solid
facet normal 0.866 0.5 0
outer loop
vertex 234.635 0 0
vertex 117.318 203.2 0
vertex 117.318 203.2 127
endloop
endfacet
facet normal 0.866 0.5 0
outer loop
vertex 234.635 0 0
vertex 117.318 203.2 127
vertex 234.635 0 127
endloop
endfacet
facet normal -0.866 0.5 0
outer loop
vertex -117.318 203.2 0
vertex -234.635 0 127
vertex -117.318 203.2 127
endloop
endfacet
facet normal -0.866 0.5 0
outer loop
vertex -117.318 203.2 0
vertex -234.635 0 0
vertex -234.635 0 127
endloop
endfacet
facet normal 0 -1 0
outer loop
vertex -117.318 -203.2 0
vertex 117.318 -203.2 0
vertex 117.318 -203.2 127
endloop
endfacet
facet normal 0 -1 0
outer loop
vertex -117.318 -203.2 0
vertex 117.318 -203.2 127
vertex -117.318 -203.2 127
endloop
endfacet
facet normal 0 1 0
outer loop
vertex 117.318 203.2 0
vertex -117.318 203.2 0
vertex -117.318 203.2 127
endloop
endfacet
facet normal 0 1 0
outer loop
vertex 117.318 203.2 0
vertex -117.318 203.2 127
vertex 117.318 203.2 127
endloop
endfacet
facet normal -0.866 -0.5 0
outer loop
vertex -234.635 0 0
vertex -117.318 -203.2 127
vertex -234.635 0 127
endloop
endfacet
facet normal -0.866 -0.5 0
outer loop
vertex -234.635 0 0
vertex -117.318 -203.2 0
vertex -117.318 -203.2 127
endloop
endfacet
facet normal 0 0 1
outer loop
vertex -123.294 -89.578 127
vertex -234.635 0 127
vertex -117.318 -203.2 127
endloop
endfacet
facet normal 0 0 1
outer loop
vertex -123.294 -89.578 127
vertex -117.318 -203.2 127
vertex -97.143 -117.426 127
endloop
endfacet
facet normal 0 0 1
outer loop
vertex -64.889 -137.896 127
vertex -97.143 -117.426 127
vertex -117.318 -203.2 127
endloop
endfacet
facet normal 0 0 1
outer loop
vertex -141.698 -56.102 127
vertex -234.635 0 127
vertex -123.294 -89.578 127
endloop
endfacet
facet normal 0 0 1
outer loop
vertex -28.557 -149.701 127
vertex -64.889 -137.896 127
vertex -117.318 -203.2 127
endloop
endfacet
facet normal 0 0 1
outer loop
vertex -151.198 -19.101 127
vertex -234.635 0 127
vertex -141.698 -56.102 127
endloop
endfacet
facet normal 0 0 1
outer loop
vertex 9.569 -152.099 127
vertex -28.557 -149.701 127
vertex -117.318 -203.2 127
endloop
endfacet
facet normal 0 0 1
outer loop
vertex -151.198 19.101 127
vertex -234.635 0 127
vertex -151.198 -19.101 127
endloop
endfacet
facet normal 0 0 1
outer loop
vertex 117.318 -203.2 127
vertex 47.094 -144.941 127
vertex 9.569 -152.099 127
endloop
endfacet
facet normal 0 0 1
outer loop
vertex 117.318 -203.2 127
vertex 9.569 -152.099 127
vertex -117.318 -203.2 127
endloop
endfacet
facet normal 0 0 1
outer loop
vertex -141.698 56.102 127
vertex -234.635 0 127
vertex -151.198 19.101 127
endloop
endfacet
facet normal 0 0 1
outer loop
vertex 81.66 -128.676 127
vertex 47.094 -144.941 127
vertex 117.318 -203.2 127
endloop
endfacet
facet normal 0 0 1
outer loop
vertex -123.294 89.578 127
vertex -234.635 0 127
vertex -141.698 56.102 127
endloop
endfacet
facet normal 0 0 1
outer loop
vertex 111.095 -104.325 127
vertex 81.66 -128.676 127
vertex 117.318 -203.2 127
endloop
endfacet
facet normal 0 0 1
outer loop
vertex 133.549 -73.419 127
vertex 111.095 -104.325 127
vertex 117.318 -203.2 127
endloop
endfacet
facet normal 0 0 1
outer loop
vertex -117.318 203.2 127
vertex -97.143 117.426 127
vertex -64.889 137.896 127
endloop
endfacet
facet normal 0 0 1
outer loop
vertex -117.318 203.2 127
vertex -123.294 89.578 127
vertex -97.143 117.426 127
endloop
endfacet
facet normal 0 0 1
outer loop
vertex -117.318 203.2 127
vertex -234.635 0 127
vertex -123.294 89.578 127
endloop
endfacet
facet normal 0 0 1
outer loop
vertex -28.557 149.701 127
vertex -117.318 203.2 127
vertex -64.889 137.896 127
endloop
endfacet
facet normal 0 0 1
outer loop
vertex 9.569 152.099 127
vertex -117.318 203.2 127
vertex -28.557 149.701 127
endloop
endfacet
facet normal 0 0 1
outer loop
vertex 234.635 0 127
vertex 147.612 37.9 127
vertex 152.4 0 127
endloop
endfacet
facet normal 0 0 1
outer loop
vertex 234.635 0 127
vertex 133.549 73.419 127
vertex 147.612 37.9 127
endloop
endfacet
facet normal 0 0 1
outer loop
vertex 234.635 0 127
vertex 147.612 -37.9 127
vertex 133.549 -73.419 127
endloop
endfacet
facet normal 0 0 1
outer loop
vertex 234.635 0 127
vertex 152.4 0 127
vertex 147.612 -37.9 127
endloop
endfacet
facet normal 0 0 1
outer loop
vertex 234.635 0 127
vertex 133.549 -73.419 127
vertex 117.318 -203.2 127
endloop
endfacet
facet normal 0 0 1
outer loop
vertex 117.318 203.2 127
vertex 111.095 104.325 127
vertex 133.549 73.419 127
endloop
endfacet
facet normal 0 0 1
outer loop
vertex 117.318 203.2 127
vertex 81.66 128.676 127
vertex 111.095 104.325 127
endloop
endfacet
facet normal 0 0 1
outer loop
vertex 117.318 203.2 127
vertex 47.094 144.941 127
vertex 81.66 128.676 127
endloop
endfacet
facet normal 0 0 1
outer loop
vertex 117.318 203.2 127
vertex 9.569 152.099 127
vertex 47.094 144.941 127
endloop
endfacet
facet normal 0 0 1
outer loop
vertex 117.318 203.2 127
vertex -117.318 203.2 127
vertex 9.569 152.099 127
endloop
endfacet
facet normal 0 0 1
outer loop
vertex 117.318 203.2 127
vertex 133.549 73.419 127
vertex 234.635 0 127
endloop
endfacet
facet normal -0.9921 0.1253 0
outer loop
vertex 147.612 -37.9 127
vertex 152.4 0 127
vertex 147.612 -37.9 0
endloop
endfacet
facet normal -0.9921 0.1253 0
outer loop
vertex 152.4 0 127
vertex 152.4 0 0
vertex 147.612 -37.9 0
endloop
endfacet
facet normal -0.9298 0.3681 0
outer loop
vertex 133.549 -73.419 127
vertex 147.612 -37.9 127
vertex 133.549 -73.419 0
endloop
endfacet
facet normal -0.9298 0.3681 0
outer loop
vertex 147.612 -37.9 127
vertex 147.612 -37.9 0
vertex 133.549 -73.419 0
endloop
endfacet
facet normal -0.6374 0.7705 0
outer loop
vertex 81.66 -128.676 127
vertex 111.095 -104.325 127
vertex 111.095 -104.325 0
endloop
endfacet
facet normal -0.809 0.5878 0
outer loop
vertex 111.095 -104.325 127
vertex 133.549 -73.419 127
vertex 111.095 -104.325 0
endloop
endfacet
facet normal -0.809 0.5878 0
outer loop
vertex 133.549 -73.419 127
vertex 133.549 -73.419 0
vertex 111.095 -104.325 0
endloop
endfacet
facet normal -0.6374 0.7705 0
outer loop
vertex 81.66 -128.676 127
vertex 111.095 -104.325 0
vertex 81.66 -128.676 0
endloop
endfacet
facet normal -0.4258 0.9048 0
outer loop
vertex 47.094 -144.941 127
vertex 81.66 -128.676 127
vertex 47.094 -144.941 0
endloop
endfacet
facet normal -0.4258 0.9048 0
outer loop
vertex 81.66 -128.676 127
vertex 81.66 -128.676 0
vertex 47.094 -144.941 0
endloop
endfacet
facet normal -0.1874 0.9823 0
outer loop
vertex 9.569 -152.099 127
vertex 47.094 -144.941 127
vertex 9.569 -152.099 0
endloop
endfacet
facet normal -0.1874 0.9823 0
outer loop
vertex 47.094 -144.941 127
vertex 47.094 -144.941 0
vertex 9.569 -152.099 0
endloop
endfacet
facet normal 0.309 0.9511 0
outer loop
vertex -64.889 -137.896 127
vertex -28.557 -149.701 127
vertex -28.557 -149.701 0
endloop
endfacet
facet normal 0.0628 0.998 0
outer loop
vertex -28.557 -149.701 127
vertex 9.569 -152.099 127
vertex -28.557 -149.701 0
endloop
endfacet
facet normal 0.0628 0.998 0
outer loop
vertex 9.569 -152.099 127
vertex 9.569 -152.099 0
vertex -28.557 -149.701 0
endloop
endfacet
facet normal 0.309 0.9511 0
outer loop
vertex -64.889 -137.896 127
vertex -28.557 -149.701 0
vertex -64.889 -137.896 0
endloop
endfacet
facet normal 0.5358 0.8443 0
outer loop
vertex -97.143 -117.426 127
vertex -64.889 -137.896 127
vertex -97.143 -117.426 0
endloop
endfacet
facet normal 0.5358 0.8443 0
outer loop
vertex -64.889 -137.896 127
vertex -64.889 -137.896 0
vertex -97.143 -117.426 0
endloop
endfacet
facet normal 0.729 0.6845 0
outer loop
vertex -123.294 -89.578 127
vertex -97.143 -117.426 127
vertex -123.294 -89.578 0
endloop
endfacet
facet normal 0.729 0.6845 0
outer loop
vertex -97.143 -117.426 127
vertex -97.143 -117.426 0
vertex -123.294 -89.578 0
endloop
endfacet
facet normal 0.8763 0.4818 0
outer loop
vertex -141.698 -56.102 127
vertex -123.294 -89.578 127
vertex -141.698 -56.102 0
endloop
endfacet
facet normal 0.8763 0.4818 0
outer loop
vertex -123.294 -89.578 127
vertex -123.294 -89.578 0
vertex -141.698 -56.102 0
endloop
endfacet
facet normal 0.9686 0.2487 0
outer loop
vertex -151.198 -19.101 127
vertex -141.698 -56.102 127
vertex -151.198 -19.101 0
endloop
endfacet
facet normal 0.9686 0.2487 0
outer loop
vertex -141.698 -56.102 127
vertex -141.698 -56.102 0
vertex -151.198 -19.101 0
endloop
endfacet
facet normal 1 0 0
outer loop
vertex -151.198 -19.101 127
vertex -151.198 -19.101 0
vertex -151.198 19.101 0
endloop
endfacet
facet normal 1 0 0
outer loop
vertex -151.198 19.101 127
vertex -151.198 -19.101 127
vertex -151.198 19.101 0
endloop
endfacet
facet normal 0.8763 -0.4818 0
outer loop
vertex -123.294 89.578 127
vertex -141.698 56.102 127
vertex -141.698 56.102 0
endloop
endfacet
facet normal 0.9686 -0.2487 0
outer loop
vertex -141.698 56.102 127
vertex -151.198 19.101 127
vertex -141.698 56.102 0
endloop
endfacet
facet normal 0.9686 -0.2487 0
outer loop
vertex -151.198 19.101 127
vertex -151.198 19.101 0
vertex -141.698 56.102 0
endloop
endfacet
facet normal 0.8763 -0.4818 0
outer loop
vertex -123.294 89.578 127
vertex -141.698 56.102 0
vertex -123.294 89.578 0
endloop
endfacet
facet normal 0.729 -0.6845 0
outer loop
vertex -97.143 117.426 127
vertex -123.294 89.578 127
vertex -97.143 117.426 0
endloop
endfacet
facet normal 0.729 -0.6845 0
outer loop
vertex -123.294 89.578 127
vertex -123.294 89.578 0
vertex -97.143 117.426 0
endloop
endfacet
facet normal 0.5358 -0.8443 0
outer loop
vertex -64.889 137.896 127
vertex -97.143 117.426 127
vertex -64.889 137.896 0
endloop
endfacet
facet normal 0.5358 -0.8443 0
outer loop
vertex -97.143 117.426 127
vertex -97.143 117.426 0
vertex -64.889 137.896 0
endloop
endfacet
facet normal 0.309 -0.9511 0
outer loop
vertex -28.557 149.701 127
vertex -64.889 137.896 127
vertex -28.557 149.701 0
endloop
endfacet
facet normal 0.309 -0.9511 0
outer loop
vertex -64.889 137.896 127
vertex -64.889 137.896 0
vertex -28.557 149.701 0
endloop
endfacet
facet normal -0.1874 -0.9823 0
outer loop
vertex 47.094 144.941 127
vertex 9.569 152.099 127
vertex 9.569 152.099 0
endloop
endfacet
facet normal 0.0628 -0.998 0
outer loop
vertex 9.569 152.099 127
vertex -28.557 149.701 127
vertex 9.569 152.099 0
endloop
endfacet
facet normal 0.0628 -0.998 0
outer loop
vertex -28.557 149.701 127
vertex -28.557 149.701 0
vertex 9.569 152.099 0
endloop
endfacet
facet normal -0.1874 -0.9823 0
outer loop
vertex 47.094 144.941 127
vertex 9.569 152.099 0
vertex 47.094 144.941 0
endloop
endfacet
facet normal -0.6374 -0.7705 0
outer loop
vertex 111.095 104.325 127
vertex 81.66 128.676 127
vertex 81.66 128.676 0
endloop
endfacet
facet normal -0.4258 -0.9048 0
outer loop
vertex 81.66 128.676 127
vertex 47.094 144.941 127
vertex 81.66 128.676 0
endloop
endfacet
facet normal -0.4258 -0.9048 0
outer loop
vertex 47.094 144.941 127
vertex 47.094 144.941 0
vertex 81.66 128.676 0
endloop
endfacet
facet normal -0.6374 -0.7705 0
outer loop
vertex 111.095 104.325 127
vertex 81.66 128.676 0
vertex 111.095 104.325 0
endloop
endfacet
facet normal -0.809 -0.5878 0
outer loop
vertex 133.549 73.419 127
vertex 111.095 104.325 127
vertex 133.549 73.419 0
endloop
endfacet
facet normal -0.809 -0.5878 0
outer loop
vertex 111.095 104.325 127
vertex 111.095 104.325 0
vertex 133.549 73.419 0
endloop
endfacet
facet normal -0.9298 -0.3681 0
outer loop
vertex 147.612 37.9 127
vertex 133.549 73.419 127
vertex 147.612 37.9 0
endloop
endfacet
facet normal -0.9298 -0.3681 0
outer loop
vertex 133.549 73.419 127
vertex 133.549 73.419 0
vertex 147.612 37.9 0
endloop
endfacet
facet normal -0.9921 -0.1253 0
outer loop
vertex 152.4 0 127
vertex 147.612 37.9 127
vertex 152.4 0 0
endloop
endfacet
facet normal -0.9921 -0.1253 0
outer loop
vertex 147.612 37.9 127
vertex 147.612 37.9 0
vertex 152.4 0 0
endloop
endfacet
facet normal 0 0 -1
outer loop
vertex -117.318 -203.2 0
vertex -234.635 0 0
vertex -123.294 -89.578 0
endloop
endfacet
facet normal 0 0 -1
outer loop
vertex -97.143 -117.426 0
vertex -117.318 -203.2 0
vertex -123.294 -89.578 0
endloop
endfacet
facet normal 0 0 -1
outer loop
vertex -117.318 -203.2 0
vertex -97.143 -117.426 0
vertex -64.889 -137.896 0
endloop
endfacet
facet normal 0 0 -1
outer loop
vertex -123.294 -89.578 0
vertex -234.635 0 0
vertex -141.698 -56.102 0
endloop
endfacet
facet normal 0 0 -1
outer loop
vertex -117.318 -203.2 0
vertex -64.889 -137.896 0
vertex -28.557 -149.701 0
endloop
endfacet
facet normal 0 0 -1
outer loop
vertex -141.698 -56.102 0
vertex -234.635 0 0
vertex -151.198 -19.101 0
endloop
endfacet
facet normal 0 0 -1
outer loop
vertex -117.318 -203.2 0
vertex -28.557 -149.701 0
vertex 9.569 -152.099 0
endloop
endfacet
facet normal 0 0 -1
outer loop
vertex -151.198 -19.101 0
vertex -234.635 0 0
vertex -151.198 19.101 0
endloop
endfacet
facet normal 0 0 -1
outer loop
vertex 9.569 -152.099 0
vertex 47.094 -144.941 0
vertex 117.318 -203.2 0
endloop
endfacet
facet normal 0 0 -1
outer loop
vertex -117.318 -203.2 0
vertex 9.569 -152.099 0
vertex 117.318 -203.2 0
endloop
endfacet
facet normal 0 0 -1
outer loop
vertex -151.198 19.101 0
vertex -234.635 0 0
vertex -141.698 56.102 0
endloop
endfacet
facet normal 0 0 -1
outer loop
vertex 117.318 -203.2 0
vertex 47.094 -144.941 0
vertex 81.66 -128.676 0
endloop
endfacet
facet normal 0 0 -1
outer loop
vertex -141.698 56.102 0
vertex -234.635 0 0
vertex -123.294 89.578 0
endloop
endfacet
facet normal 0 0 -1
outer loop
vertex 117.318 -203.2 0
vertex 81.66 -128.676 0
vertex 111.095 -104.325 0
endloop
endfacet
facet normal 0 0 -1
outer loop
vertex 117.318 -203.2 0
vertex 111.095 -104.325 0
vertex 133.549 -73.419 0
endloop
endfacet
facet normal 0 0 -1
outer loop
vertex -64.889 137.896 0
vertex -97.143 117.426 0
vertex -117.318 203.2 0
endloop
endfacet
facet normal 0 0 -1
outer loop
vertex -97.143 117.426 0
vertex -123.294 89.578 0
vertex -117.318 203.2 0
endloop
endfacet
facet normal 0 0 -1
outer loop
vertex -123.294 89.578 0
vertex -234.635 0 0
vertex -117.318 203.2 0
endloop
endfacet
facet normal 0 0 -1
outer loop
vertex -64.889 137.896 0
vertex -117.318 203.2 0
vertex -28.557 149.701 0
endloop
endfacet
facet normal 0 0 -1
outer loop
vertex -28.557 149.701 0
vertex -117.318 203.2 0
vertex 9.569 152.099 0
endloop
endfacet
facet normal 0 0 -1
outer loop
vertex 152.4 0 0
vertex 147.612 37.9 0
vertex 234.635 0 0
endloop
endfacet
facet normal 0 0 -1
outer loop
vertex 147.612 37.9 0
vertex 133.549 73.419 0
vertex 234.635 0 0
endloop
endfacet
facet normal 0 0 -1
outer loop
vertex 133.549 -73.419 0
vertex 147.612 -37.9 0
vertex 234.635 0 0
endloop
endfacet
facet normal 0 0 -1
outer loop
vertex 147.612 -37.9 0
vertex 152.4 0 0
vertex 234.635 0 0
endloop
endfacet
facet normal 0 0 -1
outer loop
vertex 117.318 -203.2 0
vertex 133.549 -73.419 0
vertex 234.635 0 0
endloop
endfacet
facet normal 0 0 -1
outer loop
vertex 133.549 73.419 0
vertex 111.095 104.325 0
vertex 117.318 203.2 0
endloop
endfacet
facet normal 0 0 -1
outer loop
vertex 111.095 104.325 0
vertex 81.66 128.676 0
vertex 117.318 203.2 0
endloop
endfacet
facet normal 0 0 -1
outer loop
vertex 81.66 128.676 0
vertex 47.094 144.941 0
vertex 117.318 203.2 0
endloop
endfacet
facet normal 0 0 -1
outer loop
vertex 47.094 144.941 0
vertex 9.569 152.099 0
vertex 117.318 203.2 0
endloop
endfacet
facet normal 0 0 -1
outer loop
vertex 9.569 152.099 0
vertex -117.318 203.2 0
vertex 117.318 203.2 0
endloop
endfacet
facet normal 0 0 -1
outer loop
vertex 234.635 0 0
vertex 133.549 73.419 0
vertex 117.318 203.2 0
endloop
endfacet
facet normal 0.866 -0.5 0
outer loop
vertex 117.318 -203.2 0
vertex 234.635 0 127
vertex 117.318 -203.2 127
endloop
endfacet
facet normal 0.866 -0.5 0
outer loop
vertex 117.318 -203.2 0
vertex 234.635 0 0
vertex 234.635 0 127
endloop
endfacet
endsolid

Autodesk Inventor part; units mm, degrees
ref_plane "YZ Plane" through (0, 0, 0) normal (1, 0, 0) x (0, 1, 0)
ref_plane "XZ Plane" through (0, 0, 0) normal (0, 1, 0) x (-1, 0, 0)
ref_plane "XY Plane" through (0, 0, 0) normal (0, 0, 1) x (1, 0, 0)
sketch "Sketch1" plane through (0, 0, 0) normal (0, 0, 1) x (1, 0, 0)
  line L0 (234.6351, 0) -> (117.3176, -203.2)
  line L1 (117.3176, -203.2) -> (-117.3176, -203.2)
  line L2 (-117.3176, -203.2) -> (-234.6351, 0)
  line L3 (-234.6351, 0) -> (-117.3176, 203.2)
  line L4 (-117.3176, 203.2) -> (117.3176, 203.2)
  line L5 (117.3176, 203.2) -> (234.6351, 0)
  circle A0 centre (0, 0) radius 152.4
  point P0 (0, -203.2)
  point P1 (0, 203.2)
  dimension "d0" = 406.4
  dimension "d1" = 304.8
extrude "Extrusion1" add sketch "Sketch1" along normal blind 127
properties part number "Bolt"
